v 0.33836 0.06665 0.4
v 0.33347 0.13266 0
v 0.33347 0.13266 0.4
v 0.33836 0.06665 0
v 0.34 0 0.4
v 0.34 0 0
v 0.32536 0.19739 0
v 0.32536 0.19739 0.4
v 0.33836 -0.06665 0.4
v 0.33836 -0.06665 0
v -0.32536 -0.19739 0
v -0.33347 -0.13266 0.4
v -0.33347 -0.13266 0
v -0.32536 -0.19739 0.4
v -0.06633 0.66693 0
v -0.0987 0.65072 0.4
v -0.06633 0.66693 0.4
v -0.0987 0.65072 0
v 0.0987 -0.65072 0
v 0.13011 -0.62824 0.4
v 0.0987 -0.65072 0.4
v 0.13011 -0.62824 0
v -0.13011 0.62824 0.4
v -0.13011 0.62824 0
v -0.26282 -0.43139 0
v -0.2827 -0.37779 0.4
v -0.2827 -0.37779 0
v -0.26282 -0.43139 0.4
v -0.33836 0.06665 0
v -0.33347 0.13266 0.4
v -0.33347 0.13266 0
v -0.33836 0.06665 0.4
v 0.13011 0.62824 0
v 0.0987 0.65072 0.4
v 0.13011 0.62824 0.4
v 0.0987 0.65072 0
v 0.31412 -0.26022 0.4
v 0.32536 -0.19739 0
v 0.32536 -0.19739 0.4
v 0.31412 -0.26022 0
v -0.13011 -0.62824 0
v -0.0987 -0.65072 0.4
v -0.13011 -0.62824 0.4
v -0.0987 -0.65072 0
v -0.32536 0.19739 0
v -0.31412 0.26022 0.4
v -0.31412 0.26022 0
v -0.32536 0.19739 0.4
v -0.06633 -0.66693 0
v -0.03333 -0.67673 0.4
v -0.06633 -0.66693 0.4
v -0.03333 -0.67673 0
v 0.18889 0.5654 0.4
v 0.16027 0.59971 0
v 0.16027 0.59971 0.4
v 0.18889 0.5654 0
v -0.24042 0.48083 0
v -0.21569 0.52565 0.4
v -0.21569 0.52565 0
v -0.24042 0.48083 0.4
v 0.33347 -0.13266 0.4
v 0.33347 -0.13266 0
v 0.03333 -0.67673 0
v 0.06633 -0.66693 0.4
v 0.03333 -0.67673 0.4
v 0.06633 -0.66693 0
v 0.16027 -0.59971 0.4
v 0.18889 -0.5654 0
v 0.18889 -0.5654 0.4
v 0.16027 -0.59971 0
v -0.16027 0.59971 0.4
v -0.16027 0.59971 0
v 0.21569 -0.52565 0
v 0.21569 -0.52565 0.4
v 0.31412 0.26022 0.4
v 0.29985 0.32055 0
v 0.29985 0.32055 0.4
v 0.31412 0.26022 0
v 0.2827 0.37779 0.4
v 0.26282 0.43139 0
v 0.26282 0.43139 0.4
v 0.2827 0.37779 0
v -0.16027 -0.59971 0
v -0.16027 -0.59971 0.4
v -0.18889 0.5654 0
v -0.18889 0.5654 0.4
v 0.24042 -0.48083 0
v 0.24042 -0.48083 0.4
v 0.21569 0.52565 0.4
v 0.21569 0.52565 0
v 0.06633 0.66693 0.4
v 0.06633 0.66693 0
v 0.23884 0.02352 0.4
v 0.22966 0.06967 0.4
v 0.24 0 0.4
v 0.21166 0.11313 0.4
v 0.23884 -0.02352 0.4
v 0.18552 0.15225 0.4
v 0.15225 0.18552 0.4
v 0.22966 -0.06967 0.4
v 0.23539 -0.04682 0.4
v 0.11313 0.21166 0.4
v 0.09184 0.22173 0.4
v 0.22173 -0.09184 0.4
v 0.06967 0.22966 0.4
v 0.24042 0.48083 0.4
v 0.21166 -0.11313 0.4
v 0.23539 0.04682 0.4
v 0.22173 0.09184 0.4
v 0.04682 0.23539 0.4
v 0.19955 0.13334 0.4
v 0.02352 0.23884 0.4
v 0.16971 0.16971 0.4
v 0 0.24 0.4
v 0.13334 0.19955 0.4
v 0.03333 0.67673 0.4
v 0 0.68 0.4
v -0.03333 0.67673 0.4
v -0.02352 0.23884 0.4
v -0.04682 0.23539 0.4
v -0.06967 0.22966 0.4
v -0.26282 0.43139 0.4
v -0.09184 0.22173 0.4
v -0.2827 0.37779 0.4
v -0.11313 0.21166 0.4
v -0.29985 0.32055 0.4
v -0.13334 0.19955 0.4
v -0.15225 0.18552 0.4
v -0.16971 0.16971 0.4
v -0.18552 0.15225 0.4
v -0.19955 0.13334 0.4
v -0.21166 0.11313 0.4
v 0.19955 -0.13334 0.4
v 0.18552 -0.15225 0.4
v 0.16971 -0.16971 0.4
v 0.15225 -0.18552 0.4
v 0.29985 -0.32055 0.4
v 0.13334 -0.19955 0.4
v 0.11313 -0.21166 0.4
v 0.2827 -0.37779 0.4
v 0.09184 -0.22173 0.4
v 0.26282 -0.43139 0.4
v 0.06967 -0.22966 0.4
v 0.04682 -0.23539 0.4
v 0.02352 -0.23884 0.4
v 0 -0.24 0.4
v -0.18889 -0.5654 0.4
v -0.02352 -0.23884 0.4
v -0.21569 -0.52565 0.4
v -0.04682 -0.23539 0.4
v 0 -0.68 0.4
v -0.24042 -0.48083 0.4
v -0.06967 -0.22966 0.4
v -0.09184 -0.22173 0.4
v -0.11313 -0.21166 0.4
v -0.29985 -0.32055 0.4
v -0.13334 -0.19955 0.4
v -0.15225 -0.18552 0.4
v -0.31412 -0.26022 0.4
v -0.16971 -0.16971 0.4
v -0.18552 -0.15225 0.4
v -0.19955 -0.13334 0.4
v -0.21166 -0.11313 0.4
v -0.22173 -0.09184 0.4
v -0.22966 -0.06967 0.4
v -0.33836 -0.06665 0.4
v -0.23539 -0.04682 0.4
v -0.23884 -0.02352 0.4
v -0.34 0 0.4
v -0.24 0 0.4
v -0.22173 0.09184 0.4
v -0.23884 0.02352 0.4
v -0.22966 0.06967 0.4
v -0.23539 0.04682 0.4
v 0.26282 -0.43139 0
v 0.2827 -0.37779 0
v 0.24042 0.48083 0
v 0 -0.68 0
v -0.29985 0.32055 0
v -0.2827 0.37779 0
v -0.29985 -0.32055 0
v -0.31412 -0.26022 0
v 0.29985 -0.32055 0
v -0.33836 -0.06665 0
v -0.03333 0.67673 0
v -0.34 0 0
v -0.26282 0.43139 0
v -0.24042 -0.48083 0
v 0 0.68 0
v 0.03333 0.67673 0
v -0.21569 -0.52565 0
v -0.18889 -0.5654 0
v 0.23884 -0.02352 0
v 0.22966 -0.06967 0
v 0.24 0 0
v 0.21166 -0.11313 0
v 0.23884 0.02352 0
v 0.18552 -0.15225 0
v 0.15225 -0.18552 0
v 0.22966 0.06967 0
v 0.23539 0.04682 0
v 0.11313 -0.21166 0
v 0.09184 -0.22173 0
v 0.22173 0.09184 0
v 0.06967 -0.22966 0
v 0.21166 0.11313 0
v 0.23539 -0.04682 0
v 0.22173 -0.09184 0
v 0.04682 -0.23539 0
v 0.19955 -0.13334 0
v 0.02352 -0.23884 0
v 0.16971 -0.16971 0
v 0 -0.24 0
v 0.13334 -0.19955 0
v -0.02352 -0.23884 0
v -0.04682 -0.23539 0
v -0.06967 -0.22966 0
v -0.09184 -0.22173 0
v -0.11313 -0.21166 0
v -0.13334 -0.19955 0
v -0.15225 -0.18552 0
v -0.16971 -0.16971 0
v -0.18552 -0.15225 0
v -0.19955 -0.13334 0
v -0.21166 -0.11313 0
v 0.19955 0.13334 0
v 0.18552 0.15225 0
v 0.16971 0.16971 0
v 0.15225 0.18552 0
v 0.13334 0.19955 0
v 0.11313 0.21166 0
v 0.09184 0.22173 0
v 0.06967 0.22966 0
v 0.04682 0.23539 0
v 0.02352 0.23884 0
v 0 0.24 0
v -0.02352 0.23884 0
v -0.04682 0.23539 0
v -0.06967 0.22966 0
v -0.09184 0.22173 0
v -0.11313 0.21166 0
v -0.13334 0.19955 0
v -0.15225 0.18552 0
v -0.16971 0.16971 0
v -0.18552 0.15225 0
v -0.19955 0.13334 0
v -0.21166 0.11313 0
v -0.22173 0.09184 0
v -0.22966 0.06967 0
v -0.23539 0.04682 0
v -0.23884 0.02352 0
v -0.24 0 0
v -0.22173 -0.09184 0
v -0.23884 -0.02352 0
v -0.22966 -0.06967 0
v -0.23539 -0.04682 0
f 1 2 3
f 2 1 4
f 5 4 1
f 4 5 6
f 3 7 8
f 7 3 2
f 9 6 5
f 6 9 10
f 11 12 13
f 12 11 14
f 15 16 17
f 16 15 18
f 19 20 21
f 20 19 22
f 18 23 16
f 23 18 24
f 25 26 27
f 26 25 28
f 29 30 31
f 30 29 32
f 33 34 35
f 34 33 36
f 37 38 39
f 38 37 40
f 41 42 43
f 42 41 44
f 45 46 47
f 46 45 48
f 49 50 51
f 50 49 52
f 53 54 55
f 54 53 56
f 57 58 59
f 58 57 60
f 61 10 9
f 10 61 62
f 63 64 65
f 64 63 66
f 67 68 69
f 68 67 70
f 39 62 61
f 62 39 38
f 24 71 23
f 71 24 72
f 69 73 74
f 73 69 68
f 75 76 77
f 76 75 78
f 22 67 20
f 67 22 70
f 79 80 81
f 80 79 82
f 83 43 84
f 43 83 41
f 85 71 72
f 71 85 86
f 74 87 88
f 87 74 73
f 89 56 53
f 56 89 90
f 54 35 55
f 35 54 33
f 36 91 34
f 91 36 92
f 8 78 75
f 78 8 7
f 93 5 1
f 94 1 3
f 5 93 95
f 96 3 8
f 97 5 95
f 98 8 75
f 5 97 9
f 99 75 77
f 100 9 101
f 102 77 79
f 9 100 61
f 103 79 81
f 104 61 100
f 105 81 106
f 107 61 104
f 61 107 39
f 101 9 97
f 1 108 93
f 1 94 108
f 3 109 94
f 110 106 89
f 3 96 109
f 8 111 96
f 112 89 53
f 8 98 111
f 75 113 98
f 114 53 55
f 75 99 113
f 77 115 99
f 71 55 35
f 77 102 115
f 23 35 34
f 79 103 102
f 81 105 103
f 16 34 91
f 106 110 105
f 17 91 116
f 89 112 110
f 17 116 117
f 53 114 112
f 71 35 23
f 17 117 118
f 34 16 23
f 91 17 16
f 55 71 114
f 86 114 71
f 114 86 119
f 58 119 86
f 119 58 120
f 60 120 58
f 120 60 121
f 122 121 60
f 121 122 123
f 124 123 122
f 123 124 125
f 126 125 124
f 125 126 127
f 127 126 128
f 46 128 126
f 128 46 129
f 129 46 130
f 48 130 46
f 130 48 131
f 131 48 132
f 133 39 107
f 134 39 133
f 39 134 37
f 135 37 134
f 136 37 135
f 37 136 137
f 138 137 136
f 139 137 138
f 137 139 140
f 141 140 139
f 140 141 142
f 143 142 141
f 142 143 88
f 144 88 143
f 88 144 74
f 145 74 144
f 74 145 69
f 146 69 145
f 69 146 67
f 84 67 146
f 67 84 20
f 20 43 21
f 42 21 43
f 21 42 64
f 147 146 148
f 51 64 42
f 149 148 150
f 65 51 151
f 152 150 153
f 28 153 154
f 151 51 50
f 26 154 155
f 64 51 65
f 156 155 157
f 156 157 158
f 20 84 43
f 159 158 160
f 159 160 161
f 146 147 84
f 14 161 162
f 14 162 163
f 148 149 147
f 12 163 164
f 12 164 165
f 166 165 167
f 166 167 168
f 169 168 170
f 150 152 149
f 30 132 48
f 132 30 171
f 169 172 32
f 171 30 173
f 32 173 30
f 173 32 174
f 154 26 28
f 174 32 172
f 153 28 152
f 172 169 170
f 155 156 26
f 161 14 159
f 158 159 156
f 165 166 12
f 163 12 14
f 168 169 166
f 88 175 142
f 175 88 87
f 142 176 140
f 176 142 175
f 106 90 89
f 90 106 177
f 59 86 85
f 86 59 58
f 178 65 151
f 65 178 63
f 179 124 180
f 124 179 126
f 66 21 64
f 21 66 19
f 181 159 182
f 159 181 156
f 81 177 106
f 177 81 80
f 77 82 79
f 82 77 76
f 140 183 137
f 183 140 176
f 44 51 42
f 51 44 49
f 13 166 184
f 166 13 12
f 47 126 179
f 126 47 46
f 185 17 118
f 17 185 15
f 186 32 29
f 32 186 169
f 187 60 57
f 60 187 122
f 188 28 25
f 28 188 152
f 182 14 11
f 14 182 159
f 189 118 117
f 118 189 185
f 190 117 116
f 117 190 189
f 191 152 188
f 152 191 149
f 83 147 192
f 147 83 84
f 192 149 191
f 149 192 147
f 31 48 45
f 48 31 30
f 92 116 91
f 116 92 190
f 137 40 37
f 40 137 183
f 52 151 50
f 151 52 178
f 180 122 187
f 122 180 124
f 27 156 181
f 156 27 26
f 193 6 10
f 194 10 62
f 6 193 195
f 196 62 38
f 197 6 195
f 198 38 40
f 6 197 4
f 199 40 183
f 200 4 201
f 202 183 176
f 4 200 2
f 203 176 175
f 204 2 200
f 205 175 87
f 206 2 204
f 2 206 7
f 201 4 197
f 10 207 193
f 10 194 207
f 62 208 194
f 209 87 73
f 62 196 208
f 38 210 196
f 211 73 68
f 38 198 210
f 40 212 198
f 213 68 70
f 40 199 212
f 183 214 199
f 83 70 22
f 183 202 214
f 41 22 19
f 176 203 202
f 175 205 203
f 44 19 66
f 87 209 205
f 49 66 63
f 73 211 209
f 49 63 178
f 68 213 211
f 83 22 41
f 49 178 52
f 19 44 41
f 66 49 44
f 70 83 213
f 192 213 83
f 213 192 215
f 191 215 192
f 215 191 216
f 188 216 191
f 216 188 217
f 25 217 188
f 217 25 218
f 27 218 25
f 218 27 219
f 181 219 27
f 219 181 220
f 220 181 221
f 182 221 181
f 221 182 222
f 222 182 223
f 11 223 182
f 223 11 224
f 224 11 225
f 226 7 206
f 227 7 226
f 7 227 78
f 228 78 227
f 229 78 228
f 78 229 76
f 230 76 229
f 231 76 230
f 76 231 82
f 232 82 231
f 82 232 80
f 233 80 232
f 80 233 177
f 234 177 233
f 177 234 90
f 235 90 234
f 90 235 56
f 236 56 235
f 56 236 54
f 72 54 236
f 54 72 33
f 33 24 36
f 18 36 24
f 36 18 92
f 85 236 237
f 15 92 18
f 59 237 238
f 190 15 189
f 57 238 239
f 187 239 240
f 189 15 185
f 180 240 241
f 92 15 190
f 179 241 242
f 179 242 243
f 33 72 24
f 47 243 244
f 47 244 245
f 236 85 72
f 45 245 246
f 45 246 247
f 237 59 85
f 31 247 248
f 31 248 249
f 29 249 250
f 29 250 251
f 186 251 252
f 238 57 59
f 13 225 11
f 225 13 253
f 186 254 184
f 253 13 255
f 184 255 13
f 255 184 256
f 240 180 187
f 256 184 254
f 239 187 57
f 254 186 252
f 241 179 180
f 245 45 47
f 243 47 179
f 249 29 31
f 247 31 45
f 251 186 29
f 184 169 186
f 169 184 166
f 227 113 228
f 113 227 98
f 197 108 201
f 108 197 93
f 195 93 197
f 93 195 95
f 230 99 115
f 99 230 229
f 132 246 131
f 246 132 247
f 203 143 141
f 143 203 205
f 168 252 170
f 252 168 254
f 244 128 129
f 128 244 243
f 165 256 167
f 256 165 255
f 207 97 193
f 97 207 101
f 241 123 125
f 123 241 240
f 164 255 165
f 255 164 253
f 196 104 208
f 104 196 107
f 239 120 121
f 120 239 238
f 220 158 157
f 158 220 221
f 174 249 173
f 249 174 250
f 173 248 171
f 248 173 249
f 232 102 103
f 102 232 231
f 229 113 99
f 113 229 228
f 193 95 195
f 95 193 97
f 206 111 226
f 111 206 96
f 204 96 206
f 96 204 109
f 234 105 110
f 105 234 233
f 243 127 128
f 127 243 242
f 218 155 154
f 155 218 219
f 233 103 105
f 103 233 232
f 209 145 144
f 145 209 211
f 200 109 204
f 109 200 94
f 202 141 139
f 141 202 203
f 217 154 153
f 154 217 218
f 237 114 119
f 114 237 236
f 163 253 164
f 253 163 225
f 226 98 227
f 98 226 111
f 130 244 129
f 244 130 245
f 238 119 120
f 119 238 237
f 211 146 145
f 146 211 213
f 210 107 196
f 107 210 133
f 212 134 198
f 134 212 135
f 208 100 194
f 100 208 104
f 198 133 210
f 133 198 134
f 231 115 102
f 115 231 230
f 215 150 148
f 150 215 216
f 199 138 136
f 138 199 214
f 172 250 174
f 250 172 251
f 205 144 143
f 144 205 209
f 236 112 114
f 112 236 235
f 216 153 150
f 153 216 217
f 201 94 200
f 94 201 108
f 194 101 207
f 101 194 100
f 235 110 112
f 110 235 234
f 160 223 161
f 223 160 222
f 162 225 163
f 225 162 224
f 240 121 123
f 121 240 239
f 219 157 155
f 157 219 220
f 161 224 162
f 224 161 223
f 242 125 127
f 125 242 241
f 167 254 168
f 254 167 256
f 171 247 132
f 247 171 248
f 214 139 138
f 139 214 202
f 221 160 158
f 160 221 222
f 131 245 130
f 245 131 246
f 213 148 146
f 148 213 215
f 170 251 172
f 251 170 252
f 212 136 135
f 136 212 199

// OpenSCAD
// file: dodecahome_config.scad
// Welcome Dodecahome

// Default settings for ATX and ITX form factor builds



// Panel index
// 0 Back upper left
// 1 Front
// 2 Back upper right
// 3 Side right
// 4 Bottom right (right back wheel)
// 5 Back right
// 6 Back (power port)
// 7 Back left
// 8 Back middle upper
// 9 Front lower (front wheel)
// 10 Side left
// 11 Bottom left (left back wheel)

// Positions/rotations of the panels calculated with
pos = [[0.5854101777076721, 0.0, 0.9472135305404663],
[1.1920929132713809e-08, 0.9472135305404663, 0.5854102373123169],
[-0.5854101777076721, 1.1920929132713809e-08, 0.9472135305404663],
[-0.9472135305404663, 0.5854101777076721, 0.0],
[-0.5854102373123169, 1.1920929132713809e-08, -0.9472135305404663],
[-0.9472135305404663, -0.5854101777076721, -1.1920929132713809e-08],
[0.0, -0.9472135305404663, -0.5854101777076721],
[0.9472135305404663, -0.5854102373123169, -1.1920929132713809e-08],
[1.1920929132713809e-08, -0.9472135305404663, 0.5854101777076721],
[0.0, 0.9472135305404663, -0.5854101777076721],
[0.9472135305404663, 0.5854101777076721, 0.0],
[0.5854101777076721, 0.0, -0.9472135305404663]];

rots = [
[0.0, -148.28252619340458, 0.0],
[58.28252330005587, -179.99999883326447, 0.0],
[6.133892063149527e-07, 148.28252619340458, 0.0],
[31.71747270143459, 90.0, 0.0],
[6.133892063149527e-07, 31.717476711648423, 0.0],
[-31.71747270143459, 89.99999927891773, 0.0],
[-58.28252330005587, -0.0, -0.0],
[-31.717476716119066, -89.99999927891773, -0.0],
[-58.28252330005587, -179.99999883326436, 0.0],
[58.28252330005587, -0.0, -0.0],
[31.71747270143459, -90.0, 0.0],
[0.0, -31.717473806595436, -0.0],
];

// These rotations align the panel edges
panel_rots = [36, -36*4.5, 0, 18 - 72*2, 180+36, -18, 18, -18, 18+72, 18+72, 18, -36];
//panel_rots = [36, -36*4.5, 0, 18, 180, -18, 18, -18, 18, 18+36, 18, 0];

// 0 is Nose Cone
// 1 is Bridge
// 2 is Life Support
// 3 is Cradle
face_groups = [0, 1, 0, 1, 3, 2, 2, 2, 0, 3, 1, 3];

// Face group palettes
pastel_gothic = ["#DB9366", "#FFBAEC", "#ADEAE6", "#93DB65"];

// 0 is Mortality Escape Pod
// 1 is Mothership
meta_groups = [0, 0, 0, 0, 1, 1, 1, 1, 0, 1, 0, 1];

unique_panel_colors = [
    "#be4a2f", "#d77643", "#ead4aa", "#e4a672", "#b86f50", "#733e39",
    "#3e2731", "#a22633", "#e43b44", "#f77622", "#feae34", "#fee761"
];

// Indicate whether standard ventilation should be cutout on a panel
vents = [true, true, true, true, true, true, true, true, true, true, true, true];

// In ROBOT MODE, the wheels are configured into a triwheel design
// Settings to configure robotic aspects and motherboard size
robot_mode = true;


build_config = "PROTOTYPE";

dihedral = 116.565;

// 1 unit is 1 cm
// ATX
// Circumradius of pentagon
panel_radius = 16;

// ITX
//panel_radius=14;

panel_thickness = .3;

panel_Z = panel_thickness/tan(116.565/2);
// inner_panel_radius = panel_radius - panel_Z;
// I'm not sure if this is correct, I just guessed
inner_panel_radius = panel_radius-(panel_thickness-panel_Z)*2;

// Hex vent

// Production
//cell_size = 0.3;
//wall_thickness = 0.1;

// Small
// cell_size = 0.4;
// wall_thickness = 0.2;

// Large
//cell_size = 0.6;
//wall_thickness = .3;

// Iterate
cell_size = 10.0;
wall_thickness = .01;

// The distance from a corner to the center of an M3 hole (for connectors)
// the radius is centered at the base corner
pcorner_dist = 3;
m3_distance_from_panel_corner = [pcorner_dist, pcorner_dist, pcorner_dist , pcorner_dist , pcorner_dist ];

// The space between the M3 screws to secure power variant vertex connector
// (Bottom of Cradle panels)
power_secure_spacing = 4.0;
// Space between M3 screws on panel corners/connector notches with 2 screws
// Front mothership and fan
// (currently this should be <= 1.8, otherwise it will not extend to the inner surface of a vertex notch
standard_secure_spacing = 1.3;

// The distance from the panel edge, which is not vented
border_edge = 1.0;

// https://en.wikipedia.org/wiki/Pentagon
eq_panel_edge_length = sqrt((5-sqrt(5))/2);
panel_edge_length = panel_radius*eq_panel_edge_length;

eq_panel_height = sqrt(5 + 2*sqrt(5))/2;
panel_height = eq_panel_height * panel_edge_length;

inner_panel_edge_length = inner_panel_radius*eq_panel_edge_length;
inner_panel_height = eq_panel_height*inner_panel_edge_length;

eq_height_vertical = sin(dihedral/2);
height_vertical = eq_height_vertical * panel_height;

height_stack = height_vertical*2;

tetra_a = 37.3774;
// 20.9052
// Tetrahedron C
magic_angle = atan(panel_edge_length/height_stack);

RAM = 128; // ;)

// Mounting bracket for wheels
bracket_height = 2.8;
bracket_start = 1.0;
bracket_width = 2.0;
insert_width = 5.0;
insert_partial = insert_width-bracket_width;

// Wheel Mount Panel Insert Offset;
// ie how far from bottom of panel to difference the wheel mount insert
wmb_pio = 5;

interior_scale = (25.9789/1.40126);
to_wheel_mount_surface = -16.9118;

brass_insert_radius = 4.8/2/10;
brass_insert_height = 4/10;

screw_clearance = 0.03;
m3_rad = 0.15+screw_clearance;

module BrassInsert()
{
    $fn=64;
    cylinder(0.4, (0.5-0.02)/2, (0.5-0.02)/2);
}

module BrassInsertHolder()
{
    $fn=64;
    cylinder(0.4, 0.5, 0.5);
}
// main file
include <dodecahome_config.scad>

// Pieces to screw onto the ends of screw sliders to secure peach core
// This can be soft to accomodate variation

// So rather than a brass insert it should use a nut catchment

// Alternatively: pour a silicon mold of the core

difference()
{
$fn=64;
scale([1, 2, 1]) cylinder(0.4, (0.7-0.02)/2, (0.7-0.02)/2);
//translate([-0.35, -0.35, 0]) cube([0.7, 0.7, 0.4], center=false);
BrassInsert();
}
